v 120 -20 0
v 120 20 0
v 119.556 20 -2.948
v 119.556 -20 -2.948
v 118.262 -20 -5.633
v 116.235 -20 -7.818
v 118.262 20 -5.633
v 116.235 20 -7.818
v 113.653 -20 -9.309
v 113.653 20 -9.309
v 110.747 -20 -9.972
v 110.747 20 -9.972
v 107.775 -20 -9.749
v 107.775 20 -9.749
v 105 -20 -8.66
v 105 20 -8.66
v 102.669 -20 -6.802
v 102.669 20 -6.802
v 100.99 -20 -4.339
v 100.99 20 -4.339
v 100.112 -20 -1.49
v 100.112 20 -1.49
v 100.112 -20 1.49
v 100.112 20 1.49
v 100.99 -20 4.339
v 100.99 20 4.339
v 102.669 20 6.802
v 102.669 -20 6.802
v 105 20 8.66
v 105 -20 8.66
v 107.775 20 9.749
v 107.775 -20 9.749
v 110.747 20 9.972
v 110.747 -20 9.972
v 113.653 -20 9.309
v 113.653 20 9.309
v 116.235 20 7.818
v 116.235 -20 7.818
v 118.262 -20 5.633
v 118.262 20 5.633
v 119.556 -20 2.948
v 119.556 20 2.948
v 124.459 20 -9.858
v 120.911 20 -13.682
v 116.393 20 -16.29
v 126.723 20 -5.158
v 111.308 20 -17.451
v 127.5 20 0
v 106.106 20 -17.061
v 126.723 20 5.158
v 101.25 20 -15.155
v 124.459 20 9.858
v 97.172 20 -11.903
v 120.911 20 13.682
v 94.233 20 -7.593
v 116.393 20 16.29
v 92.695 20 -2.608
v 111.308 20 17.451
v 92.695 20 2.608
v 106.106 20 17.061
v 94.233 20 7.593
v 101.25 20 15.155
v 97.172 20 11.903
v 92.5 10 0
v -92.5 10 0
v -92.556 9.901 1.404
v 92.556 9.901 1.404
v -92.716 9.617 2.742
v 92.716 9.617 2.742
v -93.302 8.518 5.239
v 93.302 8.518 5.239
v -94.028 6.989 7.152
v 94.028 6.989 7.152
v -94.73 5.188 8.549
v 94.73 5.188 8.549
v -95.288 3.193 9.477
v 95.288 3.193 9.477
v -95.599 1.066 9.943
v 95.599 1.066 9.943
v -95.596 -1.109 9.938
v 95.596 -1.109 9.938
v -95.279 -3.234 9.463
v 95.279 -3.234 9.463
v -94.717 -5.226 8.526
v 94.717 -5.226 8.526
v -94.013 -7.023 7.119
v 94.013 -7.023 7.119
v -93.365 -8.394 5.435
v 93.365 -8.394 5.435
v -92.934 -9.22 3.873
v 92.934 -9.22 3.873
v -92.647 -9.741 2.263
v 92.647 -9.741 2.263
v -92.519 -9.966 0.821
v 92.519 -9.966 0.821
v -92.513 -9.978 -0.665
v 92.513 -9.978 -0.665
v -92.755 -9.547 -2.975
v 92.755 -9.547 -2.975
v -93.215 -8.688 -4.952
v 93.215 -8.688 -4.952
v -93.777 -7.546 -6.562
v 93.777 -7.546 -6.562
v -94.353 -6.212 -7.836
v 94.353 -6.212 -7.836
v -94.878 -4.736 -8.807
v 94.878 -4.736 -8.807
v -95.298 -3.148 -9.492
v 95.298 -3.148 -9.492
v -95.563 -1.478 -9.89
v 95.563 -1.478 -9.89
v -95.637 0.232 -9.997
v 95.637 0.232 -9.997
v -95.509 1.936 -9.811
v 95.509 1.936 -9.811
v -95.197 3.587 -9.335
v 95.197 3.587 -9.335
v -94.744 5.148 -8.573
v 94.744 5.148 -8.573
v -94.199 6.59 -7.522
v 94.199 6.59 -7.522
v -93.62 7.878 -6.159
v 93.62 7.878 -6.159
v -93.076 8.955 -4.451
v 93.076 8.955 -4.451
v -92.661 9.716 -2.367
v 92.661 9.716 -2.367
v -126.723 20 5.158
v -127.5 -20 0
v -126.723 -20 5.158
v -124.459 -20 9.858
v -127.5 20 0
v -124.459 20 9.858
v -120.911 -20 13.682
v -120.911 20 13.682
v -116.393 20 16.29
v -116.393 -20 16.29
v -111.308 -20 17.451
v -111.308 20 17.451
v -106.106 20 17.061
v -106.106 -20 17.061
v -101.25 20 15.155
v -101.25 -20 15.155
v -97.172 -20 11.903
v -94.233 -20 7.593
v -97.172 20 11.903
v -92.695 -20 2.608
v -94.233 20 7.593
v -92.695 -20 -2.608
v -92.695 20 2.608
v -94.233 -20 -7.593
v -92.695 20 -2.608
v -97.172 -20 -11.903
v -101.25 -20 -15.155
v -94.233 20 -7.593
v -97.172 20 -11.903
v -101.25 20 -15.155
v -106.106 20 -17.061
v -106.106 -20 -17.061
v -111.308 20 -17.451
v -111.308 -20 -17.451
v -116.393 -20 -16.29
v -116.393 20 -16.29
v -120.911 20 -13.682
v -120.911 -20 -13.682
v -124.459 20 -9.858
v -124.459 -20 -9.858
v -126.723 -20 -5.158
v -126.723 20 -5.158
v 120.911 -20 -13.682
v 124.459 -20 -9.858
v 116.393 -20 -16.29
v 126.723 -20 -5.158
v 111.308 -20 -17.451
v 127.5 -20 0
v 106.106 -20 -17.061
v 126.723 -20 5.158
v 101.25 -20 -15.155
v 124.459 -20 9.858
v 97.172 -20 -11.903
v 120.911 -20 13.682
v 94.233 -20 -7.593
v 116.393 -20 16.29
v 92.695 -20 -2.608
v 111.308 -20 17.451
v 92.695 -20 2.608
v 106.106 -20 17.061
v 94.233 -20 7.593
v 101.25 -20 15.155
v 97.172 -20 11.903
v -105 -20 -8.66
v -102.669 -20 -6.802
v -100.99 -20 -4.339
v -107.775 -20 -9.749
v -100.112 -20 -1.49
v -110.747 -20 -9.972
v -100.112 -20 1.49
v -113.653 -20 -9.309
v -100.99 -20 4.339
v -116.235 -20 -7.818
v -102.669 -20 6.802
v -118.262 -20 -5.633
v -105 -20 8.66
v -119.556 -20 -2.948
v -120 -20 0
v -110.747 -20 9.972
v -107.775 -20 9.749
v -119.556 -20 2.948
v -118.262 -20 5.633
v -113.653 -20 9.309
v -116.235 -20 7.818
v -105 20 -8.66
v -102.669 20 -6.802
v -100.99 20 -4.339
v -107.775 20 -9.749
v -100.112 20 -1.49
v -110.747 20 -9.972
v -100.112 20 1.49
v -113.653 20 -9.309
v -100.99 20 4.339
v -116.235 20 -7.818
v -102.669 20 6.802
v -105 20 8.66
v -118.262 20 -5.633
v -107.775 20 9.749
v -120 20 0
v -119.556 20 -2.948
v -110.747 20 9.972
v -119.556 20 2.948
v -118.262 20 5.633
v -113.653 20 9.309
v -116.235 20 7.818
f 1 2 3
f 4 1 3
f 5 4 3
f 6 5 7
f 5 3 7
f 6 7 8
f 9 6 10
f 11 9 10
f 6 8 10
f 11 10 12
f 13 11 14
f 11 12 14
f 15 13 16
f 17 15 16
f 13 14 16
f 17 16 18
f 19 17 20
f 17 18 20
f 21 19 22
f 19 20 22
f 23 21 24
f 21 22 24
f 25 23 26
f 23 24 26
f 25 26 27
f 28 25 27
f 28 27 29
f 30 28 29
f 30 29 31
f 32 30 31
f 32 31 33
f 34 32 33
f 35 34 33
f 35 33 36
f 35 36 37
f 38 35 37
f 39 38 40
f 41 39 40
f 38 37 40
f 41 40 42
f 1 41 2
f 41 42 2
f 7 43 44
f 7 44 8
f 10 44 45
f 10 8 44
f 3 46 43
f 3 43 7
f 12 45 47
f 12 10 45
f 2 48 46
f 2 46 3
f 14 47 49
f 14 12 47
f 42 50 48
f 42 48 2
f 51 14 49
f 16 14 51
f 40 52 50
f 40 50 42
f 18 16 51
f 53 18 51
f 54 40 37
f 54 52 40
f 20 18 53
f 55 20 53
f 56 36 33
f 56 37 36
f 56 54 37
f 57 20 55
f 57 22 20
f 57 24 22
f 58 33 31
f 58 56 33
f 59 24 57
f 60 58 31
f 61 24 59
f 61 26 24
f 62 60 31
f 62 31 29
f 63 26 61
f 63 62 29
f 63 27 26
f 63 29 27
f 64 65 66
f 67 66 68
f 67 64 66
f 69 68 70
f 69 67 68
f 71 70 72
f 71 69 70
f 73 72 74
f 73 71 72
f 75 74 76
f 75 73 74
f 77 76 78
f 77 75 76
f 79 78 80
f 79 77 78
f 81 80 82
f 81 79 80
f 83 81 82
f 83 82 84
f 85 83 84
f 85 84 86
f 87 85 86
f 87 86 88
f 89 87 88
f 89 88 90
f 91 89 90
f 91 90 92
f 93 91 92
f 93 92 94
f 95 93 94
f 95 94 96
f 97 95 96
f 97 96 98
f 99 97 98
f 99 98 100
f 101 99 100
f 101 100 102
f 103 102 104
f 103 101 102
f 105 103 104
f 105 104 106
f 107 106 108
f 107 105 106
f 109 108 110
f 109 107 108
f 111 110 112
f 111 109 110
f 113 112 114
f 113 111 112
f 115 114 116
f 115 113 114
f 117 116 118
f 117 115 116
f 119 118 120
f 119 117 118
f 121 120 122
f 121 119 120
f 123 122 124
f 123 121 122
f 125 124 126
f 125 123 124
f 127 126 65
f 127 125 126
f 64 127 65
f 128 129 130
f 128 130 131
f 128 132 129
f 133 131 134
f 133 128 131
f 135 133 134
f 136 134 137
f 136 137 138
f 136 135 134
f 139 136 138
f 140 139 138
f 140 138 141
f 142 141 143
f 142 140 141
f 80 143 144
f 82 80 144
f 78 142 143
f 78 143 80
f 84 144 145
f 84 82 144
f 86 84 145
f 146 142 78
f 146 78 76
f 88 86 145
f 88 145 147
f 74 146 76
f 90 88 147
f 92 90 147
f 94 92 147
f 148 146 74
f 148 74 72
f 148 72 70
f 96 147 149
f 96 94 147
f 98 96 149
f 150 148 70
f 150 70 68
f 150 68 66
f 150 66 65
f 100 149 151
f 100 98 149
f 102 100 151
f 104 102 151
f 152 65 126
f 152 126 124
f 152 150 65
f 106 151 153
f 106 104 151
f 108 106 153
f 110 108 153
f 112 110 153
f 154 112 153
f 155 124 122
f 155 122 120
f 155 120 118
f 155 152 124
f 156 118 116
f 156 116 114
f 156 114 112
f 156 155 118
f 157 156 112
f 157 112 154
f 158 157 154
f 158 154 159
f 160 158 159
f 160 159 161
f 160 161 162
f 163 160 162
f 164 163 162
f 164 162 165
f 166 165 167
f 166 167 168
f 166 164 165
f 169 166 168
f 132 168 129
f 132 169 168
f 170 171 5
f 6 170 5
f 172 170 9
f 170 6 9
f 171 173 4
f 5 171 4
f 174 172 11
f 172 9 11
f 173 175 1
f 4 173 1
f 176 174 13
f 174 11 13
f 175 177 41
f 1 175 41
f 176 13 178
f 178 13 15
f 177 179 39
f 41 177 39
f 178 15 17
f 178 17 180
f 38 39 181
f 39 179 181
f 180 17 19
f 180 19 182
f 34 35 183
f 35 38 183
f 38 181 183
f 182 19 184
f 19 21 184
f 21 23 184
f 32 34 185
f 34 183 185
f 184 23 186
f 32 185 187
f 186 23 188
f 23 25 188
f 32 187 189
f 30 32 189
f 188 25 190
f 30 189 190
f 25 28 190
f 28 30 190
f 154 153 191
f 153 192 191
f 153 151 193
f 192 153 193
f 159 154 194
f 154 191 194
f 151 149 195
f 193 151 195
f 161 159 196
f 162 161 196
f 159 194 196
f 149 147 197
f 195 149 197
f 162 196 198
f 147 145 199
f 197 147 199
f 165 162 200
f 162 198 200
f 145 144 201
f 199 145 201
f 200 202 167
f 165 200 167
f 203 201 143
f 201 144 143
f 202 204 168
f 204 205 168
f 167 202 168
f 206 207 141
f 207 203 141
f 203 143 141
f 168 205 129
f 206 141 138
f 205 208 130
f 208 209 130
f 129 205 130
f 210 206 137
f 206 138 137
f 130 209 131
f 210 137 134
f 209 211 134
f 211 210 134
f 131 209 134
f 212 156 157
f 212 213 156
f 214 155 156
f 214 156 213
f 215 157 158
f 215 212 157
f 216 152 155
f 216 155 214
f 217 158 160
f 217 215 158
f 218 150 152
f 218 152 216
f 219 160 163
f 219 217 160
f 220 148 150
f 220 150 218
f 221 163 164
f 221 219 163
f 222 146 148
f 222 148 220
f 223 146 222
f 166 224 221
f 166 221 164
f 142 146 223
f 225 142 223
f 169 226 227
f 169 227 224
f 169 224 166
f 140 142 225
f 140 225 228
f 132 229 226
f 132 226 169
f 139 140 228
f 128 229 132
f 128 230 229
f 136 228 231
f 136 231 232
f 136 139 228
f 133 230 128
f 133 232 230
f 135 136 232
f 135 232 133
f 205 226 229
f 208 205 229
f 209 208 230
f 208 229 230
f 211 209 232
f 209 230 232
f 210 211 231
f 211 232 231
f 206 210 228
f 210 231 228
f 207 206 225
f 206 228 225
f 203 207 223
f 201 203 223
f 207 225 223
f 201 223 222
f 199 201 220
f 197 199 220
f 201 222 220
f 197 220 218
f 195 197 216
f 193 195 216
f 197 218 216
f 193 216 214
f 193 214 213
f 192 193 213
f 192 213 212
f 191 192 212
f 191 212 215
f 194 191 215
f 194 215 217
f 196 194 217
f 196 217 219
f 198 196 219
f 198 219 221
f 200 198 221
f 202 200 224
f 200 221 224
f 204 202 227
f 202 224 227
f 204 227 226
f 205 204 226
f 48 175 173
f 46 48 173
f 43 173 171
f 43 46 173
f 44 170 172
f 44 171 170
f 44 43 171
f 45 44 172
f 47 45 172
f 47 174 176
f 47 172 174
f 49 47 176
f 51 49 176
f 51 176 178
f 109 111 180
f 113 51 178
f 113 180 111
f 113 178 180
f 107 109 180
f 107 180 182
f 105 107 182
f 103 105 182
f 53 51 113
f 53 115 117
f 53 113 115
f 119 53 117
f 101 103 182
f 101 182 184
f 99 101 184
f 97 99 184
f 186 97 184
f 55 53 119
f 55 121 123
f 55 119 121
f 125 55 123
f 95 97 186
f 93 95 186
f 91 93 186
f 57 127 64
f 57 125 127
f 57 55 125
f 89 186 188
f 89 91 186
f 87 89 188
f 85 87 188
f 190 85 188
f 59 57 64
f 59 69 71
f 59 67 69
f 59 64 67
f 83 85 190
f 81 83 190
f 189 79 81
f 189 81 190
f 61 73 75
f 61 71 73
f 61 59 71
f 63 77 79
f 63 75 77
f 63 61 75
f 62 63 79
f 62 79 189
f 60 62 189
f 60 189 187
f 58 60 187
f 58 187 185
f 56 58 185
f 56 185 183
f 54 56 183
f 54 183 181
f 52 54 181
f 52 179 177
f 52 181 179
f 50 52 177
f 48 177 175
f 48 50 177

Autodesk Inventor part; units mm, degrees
ref_plane "YZ Plane" through (0, 0, 0) normal (1, 0, 0) x (0, 1, 0)
ref_plane "XZ Plane" through (0, 0, 0) normal (0, 1, 0) x (-1, 0, 0)
ref_plane "XY Plane" through (0, 0, 0) normal (0, 0, 1) x (1, 0, 0)
sketch "Sketch1" plane through (0, 0, 0) normal (0, 0, 1) x (1, 0, 0)
  line L0 (0, 23.3412) -> (0, 0) construction
  line L1 (-110, 0) -> (0, 0)
  line L2 (110, 0) -> (0, 0)
  line L3 (-110, 0) -> (-110, 10)
  line L4 (-110, 10) -> (110, 10)
  line L5 (110, 10) -> (110, 0)
  dimension "d0" = 220
  dimension "d1" = 10
revolve "Revolution1" add sketch "Sketch1" angle 360 about axis through (110, 0, 0) along (-1, 0, 0)
sketch "Sketch2" plane through (0, 0, 0) normal (0, 1, 0) x (-1, 0, 0)
  line L0 (110, -10) -> (110, 10) projected
  circle A0 centre (110, 0) radius 17.5
  circle A1 centre (110, 0) radius 10
  point P0 (0, 0)
  dimension "d3" = 20
  dimension "d4" = 35
extrude "Extrusion1" add sketch "Sketch2" along normal mid plane 40 contours A1 L0 | L0 A1 | A0
extrude "Extrusion2" cut sketch "Sketch2" along normal mid plane 40 contours A1 L0 | L0 A1
mirror "Mirror1" about plane through (0, 0, 0) normal (1, 0, 0) of "Extrusion1"
sketch "Sketch3" plane through (110, 20, 0) normal (0, 1, 0) x (1, 0, 0)
  circle A0 centre (0, 0) radius 10
  circle A1 centre (0, 0) radius 17.5 projected
  point P0 (-110, 0)
  dimension "d9" = 20
extrude "Extrusion3" cut sketch "Sketch3" against normal blind 40 contours A0
